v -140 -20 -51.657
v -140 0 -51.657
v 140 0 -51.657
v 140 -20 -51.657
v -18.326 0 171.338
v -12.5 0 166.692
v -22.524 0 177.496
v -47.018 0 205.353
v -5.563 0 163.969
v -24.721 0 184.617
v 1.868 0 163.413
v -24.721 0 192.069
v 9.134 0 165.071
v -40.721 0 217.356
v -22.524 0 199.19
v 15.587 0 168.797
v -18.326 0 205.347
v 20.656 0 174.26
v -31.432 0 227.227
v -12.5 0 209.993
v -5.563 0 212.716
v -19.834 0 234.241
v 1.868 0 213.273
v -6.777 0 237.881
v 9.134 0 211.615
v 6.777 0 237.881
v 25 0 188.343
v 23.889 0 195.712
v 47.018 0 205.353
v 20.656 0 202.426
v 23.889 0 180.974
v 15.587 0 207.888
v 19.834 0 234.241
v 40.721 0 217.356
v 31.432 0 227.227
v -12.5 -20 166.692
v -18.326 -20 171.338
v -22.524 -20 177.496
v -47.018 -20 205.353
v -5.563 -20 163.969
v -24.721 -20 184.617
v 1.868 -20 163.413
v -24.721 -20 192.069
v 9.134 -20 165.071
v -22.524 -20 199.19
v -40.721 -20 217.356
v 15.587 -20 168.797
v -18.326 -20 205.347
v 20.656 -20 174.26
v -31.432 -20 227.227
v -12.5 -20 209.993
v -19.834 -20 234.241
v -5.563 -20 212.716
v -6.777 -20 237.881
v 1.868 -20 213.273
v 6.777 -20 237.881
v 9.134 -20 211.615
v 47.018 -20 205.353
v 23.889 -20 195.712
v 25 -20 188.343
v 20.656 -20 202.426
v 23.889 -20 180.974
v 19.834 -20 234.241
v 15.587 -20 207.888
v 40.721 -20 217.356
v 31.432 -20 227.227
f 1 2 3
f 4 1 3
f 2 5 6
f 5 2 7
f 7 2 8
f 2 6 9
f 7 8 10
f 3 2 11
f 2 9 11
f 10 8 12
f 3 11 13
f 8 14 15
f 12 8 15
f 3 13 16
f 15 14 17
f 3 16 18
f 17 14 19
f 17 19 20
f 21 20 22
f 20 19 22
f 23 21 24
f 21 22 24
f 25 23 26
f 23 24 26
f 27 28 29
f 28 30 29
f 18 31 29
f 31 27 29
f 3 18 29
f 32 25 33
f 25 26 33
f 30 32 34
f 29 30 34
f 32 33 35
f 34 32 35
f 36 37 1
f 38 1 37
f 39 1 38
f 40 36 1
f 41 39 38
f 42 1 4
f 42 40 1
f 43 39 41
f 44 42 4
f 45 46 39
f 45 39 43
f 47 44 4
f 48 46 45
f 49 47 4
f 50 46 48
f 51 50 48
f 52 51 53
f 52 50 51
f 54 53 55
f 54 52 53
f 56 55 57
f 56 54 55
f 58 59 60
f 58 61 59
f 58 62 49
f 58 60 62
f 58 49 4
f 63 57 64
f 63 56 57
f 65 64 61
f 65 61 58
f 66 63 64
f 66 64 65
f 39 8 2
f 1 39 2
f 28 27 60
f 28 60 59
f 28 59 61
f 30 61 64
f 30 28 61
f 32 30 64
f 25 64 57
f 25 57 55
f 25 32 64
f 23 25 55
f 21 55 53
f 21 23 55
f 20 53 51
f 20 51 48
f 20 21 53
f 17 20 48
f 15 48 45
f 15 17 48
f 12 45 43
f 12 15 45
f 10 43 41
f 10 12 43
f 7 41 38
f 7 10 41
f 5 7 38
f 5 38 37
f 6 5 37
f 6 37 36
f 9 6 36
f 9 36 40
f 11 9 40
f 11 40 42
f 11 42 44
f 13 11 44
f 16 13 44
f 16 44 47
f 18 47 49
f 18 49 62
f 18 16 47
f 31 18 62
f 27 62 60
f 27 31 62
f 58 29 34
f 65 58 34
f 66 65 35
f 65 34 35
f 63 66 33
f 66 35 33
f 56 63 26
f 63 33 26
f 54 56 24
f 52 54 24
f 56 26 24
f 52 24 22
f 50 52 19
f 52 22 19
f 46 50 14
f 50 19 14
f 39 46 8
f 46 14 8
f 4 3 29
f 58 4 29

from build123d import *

# Parameters (mm, degrees)
F0_R     = 25
F1_DEPTH = 20


with BuildPart() as f1:
    # F0 (on Front) → F1 (new body)
    with BuildSketch(Plane.XZ):
        with BuildLine():
            ThreePointArc((47.017566, 205.35291), (49.248748, 196.977526), (50, 188.342663))
            ThreePointArc((50, 188.342663), (-8.634863, 139.093915), (-47.017566, 205.35291))
            Line((-47.017566, 205.35291), (-140, -51.657337))
            Line((-140, -51.657337), (140, -51.657337))
            Line((140, -51.657337), (47.017566, 205.35291))
        make_face()
        with BuildLine():
            ThreePointArc((-47.017566, 205.35291), (-8.634863, 139.093915), (50, 188.342663))
            ThreePointArc((50, 188.342663), (49.248748, 196.977526), (47.017566, 205.35291))
            ThreePointArc((47.017566, 205.35291), (0, 238.342663), (-47.017566, 205.35291))
        make_face()
        with Locations((0, 188.342663)):
            Circle(F0_R, mode=Mode.SUBTRACT)
    extrude(amount=F1_DEPTH)


solid = f1.part
